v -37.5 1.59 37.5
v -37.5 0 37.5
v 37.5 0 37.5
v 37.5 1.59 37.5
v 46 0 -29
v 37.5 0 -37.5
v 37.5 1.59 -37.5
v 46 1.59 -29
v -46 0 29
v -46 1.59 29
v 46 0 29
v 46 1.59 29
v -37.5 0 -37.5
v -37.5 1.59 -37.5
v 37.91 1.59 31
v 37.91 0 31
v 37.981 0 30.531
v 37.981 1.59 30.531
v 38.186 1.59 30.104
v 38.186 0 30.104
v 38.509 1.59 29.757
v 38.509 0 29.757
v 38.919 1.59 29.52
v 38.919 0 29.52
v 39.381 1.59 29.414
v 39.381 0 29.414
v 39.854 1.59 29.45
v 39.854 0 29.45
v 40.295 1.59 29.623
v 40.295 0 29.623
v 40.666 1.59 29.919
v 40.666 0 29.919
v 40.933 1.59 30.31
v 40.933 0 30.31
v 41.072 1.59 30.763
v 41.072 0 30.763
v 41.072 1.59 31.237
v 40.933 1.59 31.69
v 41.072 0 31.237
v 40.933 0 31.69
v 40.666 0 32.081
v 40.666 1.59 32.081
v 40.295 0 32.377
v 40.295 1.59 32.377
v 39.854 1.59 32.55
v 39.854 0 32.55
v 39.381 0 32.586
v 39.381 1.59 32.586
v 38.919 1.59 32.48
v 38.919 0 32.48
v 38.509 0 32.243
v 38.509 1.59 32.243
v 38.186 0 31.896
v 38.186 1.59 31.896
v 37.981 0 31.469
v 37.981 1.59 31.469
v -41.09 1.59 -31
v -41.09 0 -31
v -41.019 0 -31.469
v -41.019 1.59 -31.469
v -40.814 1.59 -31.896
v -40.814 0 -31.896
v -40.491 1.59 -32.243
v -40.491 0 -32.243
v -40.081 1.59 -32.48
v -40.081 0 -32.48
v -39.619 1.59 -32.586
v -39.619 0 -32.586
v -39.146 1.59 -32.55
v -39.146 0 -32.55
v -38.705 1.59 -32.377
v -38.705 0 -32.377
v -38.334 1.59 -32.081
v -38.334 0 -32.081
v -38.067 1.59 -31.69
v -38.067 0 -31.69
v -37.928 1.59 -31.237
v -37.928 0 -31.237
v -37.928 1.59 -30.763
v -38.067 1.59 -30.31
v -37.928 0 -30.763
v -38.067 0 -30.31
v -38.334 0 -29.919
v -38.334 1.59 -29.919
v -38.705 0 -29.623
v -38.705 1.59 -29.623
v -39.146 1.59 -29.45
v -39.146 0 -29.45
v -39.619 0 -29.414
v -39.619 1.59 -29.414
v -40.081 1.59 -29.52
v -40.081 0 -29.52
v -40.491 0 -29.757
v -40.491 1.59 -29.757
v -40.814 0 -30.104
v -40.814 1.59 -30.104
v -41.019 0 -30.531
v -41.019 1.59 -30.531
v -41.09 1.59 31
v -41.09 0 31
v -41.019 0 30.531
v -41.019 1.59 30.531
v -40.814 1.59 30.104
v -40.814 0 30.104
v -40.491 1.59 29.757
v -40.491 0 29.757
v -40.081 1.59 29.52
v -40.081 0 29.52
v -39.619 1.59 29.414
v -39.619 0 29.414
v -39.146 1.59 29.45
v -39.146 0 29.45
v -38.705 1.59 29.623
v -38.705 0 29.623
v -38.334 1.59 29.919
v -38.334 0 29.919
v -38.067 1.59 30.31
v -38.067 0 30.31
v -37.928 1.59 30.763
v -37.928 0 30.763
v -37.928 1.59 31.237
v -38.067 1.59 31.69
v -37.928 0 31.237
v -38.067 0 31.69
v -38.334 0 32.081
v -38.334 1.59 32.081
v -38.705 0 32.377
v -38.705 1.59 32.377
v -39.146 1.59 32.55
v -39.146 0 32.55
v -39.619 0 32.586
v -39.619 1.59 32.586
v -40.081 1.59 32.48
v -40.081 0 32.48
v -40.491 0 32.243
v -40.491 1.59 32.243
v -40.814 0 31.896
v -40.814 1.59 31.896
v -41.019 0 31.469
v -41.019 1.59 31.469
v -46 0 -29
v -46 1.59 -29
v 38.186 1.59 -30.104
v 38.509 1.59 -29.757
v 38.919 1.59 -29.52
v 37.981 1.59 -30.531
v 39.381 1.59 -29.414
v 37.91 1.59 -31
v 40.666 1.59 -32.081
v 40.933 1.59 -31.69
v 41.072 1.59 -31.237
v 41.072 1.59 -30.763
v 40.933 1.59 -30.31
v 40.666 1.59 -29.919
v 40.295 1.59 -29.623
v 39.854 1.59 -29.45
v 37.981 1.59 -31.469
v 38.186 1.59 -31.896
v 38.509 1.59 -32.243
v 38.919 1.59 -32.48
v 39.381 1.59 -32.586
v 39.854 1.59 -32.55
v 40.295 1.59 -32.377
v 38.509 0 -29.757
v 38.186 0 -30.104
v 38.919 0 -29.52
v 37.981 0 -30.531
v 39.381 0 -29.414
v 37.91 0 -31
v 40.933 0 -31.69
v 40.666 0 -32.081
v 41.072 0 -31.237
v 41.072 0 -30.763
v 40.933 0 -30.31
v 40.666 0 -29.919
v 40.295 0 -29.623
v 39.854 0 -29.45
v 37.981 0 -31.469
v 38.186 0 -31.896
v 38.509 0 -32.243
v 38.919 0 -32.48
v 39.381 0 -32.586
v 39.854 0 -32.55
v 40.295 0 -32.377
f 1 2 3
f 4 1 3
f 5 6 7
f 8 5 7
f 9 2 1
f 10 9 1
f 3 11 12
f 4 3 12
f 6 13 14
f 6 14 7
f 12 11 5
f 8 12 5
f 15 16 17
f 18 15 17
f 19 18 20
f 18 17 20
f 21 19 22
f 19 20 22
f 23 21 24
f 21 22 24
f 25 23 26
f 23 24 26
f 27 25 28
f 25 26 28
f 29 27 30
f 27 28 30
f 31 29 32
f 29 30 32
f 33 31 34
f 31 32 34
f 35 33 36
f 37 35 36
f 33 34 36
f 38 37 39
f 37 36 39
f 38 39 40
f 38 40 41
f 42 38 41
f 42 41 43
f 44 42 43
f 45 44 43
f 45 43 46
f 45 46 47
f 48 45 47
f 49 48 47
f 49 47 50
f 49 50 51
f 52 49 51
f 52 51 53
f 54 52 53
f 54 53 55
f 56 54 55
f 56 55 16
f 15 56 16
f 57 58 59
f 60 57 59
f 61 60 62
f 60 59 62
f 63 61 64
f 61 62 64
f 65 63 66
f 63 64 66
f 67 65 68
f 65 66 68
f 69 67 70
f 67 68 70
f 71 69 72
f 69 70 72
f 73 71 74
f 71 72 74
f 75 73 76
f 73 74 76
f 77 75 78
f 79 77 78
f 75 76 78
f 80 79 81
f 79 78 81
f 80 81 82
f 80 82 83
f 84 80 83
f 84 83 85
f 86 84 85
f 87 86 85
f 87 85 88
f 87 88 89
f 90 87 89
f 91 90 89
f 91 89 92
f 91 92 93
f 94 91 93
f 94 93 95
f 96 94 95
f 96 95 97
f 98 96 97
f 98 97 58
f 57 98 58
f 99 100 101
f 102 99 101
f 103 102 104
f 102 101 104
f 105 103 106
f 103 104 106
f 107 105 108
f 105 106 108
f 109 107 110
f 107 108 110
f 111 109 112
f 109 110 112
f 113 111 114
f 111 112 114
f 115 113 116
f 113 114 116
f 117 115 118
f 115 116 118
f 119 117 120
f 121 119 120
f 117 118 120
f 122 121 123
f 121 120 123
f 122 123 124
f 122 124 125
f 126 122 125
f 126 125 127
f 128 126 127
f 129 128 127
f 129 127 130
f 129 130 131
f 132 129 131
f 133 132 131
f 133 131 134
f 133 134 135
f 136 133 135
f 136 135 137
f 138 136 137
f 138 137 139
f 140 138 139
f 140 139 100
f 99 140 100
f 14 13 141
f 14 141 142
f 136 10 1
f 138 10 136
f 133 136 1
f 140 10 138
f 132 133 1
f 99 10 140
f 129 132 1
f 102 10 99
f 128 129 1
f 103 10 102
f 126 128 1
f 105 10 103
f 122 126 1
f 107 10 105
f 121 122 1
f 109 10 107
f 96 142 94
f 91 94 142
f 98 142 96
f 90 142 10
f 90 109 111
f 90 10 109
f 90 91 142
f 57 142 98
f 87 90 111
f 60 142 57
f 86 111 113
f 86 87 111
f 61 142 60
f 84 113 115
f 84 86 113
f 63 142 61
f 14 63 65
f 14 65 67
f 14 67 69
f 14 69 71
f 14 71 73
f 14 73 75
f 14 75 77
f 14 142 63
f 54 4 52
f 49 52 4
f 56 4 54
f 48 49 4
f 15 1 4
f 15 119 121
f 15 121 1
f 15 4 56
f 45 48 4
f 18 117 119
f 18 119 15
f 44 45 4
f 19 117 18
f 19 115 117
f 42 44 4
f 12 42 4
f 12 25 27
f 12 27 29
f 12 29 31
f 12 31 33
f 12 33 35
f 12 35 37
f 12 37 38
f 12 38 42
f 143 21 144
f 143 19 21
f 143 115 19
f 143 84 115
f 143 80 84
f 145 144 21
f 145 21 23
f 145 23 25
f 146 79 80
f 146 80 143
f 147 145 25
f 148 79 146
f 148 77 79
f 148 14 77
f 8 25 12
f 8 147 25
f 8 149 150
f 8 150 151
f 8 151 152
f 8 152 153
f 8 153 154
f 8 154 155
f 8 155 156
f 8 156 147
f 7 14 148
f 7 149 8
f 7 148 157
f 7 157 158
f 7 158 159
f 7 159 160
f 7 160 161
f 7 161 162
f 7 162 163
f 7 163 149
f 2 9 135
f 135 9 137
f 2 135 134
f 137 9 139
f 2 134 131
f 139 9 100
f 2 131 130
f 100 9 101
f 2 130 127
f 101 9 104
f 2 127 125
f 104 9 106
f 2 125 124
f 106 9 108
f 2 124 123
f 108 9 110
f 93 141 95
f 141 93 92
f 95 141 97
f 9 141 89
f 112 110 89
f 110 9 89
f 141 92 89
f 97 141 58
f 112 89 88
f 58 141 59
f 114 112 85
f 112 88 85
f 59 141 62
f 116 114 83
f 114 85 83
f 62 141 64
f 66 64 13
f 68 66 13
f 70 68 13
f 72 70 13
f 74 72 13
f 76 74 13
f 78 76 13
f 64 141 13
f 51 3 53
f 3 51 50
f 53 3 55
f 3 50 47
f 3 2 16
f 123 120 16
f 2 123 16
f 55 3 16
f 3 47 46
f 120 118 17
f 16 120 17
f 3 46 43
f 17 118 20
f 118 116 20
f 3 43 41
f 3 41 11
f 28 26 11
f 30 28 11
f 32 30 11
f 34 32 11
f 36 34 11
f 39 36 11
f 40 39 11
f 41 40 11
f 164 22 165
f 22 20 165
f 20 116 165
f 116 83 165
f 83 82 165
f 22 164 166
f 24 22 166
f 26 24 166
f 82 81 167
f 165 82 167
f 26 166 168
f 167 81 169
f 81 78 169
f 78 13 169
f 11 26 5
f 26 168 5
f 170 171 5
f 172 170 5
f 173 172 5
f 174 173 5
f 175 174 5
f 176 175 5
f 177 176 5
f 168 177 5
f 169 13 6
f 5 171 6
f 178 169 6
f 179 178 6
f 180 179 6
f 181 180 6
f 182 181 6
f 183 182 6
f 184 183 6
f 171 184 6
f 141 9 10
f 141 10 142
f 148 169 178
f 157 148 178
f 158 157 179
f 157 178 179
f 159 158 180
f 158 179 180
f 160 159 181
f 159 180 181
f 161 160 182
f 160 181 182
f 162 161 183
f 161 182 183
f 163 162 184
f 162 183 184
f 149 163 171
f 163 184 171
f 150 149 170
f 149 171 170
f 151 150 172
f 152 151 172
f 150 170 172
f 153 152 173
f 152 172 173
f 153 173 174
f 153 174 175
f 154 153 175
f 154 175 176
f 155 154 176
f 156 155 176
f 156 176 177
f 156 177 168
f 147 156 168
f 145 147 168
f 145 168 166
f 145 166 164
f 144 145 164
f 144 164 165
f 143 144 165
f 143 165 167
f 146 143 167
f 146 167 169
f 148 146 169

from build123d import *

# Parameters (mm, degrees)
SKETCH1_W             = 92
SKETCH1_H             = 75
BOSS_EXTRUDE1_DEPTH   = 1.59
CHAMFER1_SIZE         = 8.5
F_1_0MM_DOWEL_HOLE1_D = 3.18


with BuildPart() as part:
    # Sketch1 → Boss-Extrude1 (new body)
    with BuildSketch(Plane(origin=(0, 0, 0), x_dir=(1, 0, 0), z_dir=(0, 1, 0))):
        Rectangle(SKETCH1_W, SKETCH1_H)
    extrude(amount=BOSS_EXTRUDE1_DEPTH)

    # Chamfer1
    chamfer1_edges = [part.edges().sort_by_distance(p)[0] for p in [
        (-46, 0.795, 37.5),
        (-46, 0.795, -37.5),
        (46, 0.795, -37.5),
        (46, 0.795, 37.5),
    ]]
    chamfer(chamfer1_edges, length=CHAMFER1_SIZE)

    # Ø1.0mm Dowel Hole1 (through all)
    with Locations(Plane(origin=(0, 1.59, 0), x_dir=(1, 0, 0), z_dir=(0, 1, 0))):
        with Locations((-39.5, 31), (39.5, 31), (39.5, -31), (-39.5, -31)):
            Hole(F_1_0MM_DOWEL_HOLE1_D / 2)


solid = part.part
